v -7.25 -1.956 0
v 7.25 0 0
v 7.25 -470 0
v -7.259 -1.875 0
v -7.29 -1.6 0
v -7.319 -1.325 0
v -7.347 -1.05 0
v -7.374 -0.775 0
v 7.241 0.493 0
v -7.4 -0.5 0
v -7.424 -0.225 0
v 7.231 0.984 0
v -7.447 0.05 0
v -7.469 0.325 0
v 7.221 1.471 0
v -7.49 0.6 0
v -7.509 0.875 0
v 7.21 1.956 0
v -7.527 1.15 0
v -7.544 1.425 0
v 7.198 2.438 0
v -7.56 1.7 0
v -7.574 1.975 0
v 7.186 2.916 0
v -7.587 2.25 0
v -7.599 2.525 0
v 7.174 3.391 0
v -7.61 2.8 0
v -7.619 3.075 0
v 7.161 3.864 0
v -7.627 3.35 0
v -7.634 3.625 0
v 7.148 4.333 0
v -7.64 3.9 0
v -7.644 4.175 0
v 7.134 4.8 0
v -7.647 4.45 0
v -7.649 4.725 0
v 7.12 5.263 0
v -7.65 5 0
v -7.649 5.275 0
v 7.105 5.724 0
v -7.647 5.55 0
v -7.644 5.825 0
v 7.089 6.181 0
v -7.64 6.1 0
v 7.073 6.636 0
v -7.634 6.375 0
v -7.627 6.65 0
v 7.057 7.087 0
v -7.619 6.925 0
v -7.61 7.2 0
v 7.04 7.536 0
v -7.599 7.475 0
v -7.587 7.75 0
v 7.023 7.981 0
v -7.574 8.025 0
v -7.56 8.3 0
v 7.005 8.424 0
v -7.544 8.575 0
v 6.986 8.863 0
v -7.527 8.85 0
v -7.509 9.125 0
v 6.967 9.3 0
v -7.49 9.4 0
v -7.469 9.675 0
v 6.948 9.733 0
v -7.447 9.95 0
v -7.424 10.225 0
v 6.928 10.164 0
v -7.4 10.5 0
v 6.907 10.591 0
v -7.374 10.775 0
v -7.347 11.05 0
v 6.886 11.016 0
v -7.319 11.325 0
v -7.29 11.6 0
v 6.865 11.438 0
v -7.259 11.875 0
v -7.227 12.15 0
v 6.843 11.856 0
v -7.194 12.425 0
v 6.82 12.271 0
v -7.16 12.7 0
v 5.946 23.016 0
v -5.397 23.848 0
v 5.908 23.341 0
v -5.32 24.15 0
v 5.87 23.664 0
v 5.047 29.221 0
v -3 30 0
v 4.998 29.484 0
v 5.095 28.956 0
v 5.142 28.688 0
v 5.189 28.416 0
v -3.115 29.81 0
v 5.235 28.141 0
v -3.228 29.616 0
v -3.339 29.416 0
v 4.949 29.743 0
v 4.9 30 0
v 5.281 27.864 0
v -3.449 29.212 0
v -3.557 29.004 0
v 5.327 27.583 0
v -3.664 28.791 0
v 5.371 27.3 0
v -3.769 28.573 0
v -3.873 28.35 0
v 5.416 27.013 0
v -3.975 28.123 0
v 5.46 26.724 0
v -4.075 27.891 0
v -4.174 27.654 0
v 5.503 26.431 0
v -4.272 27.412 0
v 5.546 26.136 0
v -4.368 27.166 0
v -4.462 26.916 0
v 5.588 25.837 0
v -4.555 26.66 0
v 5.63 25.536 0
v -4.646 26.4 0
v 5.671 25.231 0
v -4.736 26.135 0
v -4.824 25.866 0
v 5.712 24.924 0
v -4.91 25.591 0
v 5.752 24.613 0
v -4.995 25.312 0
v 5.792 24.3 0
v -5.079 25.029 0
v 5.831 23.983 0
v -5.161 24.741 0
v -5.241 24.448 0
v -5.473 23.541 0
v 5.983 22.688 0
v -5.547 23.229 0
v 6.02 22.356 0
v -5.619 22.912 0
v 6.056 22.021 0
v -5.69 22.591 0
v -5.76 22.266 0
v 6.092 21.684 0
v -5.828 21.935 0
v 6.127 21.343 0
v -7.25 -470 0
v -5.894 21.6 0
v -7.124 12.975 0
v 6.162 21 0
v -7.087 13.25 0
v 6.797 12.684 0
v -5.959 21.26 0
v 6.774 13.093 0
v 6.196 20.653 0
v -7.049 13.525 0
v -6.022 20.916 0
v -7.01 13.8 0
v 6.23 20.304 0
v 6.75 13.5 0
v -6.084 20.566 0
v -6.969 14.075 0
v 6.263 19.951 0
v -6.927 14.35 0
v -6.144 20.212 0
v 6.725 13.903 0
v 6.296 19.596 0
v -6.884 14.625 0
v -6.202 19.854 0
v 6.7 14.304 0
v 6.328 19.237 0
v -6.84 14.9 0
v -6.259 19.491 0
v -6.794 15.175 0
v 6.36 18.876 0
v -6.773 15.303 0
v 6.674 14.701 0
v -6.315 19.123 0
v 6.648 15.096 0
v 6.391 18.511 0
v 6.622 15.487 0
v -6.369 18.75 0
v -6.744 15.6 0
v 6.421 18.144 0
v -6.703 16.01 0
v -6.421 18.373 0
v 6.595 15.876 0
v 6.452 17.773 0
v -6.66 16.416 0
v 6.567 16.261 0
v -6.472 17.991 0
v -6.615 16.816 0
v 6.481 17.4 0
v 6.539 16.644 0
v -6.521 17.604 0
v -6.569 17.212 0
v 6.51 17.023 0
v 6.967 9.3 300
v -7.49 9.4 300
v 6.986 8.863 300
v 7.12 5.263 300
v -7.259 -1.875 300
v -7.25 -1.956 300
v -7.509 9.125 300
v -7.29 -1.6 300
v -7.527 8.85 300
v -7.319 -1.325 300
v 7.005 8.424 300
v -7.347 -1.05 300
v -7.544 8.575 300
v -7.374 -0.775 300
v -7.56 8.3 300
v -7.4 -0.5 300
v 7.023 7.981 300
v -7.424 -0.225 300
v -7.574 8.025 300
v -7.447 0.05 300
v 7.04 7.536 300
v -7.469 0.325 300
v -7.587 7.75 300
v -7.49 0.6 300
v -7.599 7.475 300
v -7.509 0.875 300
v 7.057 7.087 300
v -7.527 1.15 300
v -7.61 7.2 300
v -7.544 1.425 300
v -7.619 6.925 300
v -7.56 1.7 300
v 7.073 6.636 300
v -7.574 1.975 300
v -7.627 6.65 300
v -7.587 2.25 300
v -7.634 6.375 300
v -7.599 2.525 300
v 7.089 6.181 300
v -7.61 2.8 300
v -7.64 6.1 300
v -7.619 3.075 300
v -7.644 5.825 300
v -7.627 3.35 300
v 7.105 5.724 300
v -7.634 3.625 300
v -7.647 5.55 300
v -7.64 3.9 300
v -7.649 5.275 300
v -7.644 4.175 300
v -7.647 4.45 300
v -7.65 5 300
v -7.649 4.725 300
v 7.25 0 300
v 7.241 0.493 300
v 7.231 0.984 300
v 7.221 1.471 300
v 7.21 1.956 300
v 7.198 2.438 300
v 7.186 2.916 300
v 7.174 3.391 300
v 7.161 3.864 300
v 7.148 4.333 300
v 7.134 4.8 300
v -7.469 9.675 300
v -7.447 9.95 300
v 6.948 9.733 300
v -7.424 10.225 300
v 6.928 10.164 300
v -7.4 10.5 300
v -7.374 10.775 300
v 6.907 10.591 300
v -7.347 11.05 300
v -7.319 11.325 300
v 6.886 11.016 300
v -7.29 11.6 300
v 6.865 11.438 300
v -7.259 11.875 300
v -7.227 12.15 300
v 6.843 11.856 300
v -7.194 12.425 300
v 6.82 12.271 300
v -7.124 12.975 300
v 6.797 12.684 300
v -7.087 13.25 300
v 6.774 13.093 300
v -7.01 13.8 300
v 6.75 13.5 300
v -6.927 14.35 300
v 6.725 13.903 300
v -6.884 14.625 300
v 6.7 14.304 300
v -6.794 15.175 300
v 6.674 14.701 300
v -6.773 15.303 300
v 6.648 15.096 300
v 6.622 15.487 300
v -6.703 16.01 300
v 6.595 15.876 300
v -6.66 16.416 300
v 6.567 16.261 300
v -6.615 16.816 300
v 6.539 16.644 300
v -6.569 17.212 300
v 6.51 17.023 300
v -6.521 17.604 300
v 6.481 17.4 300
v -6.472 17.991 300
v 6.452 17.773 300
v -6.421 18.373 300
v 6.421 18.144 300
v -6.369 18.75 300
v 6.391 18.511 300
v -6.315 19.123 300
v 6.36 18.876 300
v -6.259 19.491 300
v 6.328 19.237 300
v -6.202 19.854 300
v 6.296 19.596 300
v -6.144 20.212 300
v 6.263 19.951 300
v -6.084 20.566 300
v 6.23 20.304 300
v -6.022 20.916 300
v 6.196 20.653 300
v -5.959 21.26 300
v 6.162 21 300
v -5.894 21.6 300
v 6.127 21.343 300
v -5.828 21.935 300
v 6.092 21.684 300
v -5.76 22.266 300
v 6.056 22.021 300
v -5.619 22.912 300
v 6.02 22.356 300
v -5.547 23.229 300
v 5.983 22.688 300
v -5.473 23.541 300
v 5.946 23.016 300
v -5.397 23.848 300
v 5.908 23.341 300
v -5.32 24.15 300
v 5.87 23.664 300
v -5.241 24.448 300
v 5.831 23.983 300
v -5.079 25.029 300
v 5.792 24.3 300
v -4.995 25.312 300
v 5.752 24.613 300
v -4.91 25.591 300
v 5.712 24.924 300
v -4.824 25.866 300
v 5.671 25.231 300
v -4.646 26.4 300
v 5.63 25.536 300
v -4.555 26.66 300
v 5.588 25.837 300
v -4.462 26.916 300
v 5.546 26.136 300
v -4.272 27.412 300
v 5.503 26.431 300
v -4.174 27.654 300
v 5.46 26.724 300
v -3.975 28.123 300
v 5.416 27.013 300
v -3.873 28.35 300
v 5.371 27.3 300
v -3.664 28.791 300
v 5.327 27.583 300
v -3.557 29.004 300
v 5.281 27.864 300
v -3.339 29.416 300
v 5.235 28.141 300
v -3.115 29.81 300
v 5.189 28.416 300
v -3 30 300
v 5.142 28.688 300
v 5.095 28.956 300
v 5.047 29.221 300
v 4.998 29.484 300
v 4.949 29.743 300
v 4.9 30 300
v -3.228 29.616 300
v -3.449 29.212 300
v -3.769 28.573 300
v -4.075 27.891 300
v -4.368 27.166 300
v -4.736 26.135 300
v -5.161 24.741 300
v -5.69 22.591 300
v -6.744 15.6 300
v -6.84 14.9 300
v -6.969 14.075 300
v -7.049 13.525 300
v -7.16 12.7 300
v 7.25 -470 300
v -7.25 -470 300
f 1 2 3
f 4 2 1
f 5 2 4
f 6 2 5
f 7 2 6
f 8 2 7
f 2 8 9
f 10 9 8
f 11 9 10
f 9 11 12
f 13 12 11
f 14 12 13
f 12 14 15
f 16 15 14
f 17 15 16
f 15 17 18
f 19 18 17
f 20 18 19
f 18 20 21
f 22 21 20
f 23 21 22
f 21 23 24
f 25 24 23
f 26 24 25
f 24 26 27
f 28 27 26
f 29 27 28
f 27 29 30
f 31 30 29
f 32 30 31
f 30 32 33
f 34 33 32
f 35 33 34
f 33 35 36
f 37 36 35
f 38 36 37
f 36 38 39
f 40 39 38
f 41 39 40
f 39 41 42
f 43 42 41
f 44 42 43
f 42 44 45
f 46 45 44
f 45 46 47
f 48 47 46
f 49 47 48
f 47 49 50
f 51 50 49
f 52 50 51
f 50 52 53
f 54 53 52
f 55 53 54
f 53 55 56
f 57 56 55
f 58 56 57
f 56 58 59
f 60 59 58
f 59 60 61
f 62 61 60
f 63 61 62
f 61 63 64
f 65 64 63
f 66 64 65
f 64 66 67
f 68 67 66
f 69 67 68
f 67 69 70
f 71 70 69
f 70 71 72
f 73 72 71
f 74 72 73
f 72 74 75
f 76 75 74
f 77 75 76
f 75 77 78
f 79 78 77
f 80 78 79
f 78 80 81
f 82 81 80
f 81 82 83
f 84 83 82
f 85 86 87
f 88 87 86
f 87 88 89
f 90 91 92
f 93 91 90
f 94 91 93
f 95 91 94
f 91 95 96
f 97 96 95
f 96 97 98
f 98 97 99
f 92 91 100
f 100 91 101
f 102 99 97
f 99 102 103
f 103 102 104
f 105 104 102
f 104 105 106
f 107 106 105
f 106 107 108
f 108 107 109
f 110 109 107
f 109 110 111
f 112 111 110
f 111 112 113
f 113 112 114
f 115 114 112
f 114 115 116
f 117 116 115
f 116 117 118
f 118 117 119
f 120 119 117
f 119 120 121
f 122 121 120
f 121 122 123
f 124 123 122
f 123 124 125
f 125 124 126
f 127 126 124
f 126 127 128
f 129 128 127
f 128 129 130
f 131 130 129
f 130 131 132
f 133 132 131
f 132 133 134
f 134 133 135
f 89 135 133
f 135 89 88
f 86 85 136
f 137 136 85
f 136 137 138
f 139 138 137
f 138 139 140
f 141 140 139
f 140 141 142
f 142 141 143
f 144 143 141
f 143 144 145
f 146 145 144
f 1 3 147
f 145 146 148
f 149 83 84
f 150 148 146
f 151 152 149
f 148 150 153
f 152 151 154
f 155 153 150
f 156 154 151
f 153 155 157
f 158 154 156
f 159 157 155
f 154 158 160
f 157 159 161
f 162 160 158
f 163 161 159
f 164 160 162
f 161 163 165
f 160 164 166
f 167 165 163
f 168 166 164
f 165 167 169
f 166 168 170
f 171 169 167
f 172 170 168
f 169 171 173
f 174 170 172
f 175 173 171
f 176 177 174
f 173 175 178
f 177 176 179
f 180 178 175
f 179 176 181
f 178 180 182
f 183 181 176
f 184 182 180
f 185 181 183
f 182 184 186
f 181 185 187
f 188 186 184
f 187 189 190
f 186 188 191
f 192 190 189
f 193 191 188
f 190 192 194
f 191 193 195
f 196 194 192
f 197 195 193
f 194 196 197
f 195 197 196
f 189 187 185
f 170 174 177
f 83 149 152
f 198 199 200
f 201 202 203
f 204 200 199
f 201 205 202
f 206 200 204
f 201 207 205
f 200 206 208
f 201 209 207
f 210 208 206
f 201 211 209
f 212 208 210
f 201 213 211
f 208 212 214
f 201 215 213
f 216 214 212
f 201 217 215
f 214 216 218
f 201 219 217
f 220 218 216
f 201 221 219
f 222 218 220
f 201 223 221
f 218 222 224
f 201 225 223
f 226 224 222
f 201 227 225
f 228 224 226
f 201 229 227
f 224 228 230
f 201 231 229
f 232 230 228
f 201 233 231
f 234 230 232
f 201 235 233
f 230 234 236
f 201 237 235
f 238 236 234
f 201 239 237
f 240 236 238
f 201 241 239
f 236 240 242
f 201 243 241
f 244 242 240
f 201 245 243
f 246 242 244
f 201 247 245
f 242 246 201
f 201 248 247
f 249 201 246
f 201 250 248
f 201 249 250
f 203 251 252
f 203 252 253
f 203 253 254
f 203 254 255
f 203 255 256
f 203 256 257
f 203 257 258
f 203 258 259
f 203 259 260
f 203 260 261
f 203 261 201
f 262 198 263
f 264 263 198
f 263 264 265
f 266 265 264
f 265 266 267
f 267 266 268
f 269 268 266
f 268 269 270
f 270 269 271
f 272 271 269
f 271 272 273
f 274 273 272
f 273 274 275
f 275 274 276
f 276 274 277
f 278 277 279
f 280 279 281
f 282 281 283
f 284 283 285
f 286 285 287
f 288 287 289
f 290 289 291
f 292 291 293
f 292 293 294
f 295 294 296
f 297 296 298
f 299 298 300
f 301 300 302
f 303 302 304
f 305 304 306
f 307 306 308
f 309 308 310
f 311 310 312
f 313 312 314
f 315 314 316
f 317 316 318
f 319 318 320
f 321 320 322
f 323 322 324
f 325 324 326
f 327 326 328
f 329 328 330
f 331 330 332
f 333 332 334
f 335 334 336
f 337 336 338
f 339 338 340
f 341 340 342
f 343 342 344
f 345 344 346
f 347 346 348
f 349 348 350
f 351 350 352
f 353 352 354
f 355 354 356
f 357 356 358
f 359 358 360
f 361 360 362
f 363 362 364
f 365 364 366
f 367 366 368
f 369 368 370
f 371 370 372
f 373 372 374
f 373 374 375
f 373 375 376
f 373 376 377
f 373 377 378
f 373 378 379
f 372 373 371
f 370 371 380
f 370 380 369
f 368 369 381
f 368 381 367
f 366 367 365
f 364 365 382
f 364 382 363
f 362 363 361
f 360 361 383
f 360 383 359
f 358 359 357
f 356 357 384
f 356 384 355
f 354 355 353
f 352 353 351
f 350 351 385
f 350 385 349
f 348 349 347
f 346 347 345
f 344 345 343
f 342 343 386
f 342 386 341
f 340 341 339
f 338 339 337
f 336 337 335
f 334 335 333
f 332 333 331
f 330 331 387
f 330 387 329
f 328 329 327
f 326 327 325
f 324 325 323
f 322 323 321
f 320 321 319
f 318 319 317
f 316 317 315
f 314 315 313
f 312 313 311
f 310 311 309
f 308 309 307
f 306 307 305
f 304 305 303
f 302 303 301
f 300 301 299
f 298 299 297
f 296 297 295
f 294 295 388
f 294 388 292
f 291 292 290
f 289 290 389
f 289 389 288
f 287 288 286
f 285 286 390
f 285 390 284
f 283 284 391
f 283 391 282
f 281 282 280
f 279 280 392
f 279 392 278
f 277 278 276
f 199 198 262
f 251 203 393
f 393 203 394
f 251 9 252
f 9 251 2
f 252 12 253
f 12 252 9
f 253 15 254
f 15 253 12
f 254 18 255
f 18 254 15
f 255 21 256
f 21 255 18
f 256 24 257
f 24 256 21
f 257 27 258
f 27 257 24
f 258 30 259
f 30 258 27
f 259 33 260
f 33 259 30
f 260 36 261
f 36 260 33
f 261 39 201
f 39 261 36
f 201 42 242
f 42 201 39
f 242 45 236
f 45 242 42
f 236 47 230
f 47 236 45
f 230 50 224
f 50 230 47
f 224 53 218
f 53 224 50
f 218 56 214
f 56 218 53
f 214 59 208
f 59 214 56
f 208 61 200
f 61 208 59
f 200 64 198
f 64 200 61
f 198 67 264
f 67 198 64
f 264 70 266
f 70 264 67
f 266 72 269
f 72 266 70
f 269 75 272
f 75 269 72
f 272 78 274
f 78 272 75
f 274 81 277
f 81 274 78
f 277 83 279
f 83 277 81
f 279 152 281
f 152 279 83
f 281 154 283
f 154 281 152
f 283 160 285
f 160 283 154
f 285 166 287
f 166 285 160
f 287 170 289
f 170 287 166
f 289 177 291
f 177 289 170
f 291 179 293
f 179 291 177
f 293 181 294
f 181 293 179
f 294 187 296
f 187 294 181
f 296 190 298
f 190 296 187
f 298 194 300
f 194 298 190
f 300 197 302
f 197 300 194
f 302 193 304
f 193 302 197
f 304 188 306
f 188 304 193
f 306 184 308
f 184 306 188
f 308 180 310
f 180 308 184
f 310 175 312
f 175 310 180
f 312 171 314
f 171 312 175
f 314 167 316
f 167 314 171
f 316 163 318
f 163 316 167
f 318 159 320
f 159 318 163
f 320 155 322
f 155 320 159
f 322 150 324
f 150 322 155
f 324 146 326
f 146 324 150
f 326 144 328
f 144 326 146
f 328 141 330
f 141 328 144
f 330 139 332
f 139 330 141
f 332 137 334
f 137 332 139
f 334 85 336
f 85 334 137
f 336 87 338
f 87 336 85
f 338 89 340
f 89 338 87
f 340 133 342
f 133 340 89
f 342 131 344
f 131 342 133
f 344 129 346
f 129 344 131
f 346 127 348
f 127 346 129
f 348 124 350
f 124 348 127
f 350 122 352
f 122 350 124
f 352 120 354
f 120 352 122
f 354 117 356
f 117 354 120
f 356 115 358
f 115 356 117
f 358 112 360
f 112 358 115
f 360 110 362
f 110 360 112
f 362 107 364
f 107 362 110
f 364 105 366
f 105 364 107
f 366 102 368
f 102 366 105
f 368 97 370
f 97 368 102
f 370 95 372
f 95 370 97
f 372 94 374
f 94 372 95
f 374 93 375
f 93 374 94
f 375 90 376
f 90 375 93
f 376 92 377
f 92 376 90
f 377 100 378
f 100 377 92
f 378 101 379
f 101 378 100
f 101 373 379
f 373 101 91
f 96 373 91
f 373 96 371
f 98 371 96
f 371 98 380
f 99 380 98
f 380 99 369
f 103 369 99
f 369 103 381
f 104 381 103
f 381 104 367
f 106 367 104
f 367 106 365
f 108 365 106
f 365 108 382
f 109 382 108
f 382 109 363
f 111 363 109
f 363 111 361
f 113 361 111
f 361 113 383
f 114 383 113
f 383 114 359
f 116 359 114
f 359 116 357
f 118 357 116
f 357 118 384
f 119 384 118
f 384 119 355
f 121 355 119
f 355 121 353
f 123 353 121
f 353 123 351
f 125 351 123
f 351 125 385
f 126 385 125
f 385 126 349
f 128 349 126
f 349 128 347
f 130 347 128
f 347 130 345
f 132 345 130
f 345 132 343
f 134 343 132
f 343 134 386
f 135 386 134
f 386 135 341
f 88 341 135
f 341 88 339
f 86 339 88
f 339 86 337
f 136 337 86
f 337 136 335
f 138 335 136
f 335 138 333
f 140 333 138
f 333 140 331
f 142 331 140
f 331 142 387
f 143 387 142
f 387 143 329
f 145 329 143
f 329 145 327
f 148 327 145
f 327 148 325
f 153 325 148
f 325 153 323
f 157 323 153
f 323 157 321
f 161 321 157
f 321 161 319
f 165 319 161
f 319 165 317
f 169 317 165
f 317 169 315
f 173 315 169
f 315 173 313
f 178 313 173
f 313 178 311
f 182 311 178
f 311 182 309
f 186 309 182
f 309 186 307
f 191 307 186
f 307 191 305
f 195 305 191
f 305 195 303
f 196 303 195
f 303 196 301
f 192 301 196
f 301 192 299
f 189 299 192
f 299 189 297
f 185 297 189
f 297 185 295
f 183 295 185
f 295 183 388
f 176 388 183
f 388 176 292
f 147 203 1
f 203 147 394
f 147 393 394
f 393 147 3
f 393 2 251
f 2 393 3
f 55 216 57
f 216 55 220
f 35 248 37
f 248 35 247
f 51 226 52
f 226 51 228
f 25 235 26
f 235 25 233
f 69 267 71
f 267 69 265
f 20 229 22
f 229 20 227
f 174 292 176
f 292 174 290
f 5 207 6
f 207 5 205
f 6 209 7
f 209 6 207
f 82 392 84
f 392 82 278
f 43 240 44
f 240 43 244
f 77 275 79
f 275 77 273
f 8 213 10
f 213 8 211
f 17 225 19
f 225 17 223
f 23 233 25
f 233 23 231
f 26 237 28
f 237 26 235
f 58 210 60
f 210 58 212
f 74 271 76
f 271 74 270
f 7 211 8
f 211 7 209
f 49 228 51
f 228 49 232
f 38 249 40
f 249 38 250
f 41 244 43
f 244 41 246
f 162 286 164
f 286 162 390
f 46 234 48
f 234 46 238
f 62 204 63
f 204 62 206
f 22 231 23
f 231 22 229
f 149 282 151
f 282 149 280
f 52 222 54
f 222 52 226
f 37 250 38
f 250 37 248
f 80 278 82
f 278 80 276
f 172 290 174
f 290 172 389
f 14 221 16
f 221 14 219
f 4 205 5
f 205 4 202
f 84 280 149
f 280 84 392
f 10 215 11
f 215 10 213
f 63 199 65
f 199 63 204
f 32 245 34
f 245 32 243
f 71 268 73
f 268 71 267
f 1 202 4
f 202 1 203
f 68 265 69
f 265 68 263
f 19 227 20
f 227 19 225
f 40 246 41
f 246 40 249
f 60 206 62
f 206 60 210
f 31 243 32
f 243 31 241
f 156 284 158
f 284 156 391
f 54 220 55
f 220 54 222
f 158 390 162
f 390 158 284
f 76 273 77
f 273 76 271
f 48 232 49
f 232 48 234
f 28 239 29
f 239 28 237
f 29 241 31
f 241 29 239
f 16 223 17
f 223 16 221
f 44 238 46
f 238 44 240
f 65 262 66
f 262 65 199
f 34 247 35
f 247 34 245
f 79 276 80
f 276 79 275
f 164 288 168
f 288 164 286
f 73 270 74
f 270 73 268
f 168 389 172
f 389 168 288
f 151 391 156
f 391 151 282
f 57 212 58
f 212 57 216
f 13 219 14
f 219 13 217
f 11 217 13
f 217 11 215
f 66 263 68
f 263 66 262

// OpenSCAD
// file: ../lib/bezier.scad
function bezier3(p0, p1, p2, close=true,fn=$fn) = [
  for (t=[0:1/fn:(1 + (close? (.5 / fn) : 0 ))])
    pow(1-t, 2) * p0 + 2 * (1 - t)* t * p1 + pow(t, 2) * p2
];

function bezier4(p0, p1, p2, p3, close=true,fn=$fn) = [
  for (t=[0:1/fn:(1 + (close? (.5 / fn) : 0 ))])
    pow(1 - t, 3) * p0 + 3 * (1 - t) * (1 - t)* t * p1 +
      3 * (1 - t) * pow(t, 2) * p2 + pow(t, 3) * p3
];
// main file
use <../lib/bezier.scad>;

function outline2d(
    thickness=14.5, 
    height=30, 
    edge_front=4.9, 
    edge_back=3, 
    al = 1.05,
    bl = 0.75,
    ar = 0.95,
    br = 0.66,
    fn = $fn
    ) = 
  let (
      p0l = [-thickness / 2, 0]
    , p1l = [-thickness / 2 * al, height * bl]
    , p2l = [-edge_back, height]
    , p2r = [edge_front, height]
    , p1r = [thickness / 2 * ar, height * br]
    , p0r = [thickness / 2, 0]
  )
  concat(
      bezier3(p0l, p1l, p2l, fn=fn)
    , bezier3(p2r, p1r, p0r, fn=fn)
  );

function outline2d_ext(
    ext=10
  , thickness=14.5
  , height=30
  , edge_front=4.9
  , edge_back=3
  , al = 1.05
  , bl = 0.75
  , ar = 0.95
  , br = 0.66
  , fn = $fn
) =
  concat(
    [[-thickness / 2, -ext]],
    outline2d(thickness, height, edge_front, edge_back,
      al, bl, ar, br, fn),
    [[thickness / 2, -ext]]
  );

module pad_track(height=200, ptt2=2, pth3=22, fn=$fn) {
  linear_extrude(height=height) {
    polygon(bezier3([0, 0], [-ptt2, pth3 / 2], [0, pth3], fn=fn));
  }
}

module corner(
    width=300
  , depth=500
  , thickness=14.5
  , height=30
  , edge_front=4.9
  , edge_back=3
  , al = 1.05
  , bl = 0.75
  , ar = 0.95
  , br = 0.66
  , ptt2 = 2
  , pth3 = 22
  , psink = 0.6
  , pdy = -6
  , fn = $fn
) {
  union() {
    linear_extrude(height=width)
      polygon(outline2d_ext(ext=depth- height, fn=fn));
    translate([-thickness / 2 + psink, pdy, 0])
      pad_track(height=width, ptt2=ptt2, pth3=pth3, fn=fn);
  }
}

corner(fn=80);
